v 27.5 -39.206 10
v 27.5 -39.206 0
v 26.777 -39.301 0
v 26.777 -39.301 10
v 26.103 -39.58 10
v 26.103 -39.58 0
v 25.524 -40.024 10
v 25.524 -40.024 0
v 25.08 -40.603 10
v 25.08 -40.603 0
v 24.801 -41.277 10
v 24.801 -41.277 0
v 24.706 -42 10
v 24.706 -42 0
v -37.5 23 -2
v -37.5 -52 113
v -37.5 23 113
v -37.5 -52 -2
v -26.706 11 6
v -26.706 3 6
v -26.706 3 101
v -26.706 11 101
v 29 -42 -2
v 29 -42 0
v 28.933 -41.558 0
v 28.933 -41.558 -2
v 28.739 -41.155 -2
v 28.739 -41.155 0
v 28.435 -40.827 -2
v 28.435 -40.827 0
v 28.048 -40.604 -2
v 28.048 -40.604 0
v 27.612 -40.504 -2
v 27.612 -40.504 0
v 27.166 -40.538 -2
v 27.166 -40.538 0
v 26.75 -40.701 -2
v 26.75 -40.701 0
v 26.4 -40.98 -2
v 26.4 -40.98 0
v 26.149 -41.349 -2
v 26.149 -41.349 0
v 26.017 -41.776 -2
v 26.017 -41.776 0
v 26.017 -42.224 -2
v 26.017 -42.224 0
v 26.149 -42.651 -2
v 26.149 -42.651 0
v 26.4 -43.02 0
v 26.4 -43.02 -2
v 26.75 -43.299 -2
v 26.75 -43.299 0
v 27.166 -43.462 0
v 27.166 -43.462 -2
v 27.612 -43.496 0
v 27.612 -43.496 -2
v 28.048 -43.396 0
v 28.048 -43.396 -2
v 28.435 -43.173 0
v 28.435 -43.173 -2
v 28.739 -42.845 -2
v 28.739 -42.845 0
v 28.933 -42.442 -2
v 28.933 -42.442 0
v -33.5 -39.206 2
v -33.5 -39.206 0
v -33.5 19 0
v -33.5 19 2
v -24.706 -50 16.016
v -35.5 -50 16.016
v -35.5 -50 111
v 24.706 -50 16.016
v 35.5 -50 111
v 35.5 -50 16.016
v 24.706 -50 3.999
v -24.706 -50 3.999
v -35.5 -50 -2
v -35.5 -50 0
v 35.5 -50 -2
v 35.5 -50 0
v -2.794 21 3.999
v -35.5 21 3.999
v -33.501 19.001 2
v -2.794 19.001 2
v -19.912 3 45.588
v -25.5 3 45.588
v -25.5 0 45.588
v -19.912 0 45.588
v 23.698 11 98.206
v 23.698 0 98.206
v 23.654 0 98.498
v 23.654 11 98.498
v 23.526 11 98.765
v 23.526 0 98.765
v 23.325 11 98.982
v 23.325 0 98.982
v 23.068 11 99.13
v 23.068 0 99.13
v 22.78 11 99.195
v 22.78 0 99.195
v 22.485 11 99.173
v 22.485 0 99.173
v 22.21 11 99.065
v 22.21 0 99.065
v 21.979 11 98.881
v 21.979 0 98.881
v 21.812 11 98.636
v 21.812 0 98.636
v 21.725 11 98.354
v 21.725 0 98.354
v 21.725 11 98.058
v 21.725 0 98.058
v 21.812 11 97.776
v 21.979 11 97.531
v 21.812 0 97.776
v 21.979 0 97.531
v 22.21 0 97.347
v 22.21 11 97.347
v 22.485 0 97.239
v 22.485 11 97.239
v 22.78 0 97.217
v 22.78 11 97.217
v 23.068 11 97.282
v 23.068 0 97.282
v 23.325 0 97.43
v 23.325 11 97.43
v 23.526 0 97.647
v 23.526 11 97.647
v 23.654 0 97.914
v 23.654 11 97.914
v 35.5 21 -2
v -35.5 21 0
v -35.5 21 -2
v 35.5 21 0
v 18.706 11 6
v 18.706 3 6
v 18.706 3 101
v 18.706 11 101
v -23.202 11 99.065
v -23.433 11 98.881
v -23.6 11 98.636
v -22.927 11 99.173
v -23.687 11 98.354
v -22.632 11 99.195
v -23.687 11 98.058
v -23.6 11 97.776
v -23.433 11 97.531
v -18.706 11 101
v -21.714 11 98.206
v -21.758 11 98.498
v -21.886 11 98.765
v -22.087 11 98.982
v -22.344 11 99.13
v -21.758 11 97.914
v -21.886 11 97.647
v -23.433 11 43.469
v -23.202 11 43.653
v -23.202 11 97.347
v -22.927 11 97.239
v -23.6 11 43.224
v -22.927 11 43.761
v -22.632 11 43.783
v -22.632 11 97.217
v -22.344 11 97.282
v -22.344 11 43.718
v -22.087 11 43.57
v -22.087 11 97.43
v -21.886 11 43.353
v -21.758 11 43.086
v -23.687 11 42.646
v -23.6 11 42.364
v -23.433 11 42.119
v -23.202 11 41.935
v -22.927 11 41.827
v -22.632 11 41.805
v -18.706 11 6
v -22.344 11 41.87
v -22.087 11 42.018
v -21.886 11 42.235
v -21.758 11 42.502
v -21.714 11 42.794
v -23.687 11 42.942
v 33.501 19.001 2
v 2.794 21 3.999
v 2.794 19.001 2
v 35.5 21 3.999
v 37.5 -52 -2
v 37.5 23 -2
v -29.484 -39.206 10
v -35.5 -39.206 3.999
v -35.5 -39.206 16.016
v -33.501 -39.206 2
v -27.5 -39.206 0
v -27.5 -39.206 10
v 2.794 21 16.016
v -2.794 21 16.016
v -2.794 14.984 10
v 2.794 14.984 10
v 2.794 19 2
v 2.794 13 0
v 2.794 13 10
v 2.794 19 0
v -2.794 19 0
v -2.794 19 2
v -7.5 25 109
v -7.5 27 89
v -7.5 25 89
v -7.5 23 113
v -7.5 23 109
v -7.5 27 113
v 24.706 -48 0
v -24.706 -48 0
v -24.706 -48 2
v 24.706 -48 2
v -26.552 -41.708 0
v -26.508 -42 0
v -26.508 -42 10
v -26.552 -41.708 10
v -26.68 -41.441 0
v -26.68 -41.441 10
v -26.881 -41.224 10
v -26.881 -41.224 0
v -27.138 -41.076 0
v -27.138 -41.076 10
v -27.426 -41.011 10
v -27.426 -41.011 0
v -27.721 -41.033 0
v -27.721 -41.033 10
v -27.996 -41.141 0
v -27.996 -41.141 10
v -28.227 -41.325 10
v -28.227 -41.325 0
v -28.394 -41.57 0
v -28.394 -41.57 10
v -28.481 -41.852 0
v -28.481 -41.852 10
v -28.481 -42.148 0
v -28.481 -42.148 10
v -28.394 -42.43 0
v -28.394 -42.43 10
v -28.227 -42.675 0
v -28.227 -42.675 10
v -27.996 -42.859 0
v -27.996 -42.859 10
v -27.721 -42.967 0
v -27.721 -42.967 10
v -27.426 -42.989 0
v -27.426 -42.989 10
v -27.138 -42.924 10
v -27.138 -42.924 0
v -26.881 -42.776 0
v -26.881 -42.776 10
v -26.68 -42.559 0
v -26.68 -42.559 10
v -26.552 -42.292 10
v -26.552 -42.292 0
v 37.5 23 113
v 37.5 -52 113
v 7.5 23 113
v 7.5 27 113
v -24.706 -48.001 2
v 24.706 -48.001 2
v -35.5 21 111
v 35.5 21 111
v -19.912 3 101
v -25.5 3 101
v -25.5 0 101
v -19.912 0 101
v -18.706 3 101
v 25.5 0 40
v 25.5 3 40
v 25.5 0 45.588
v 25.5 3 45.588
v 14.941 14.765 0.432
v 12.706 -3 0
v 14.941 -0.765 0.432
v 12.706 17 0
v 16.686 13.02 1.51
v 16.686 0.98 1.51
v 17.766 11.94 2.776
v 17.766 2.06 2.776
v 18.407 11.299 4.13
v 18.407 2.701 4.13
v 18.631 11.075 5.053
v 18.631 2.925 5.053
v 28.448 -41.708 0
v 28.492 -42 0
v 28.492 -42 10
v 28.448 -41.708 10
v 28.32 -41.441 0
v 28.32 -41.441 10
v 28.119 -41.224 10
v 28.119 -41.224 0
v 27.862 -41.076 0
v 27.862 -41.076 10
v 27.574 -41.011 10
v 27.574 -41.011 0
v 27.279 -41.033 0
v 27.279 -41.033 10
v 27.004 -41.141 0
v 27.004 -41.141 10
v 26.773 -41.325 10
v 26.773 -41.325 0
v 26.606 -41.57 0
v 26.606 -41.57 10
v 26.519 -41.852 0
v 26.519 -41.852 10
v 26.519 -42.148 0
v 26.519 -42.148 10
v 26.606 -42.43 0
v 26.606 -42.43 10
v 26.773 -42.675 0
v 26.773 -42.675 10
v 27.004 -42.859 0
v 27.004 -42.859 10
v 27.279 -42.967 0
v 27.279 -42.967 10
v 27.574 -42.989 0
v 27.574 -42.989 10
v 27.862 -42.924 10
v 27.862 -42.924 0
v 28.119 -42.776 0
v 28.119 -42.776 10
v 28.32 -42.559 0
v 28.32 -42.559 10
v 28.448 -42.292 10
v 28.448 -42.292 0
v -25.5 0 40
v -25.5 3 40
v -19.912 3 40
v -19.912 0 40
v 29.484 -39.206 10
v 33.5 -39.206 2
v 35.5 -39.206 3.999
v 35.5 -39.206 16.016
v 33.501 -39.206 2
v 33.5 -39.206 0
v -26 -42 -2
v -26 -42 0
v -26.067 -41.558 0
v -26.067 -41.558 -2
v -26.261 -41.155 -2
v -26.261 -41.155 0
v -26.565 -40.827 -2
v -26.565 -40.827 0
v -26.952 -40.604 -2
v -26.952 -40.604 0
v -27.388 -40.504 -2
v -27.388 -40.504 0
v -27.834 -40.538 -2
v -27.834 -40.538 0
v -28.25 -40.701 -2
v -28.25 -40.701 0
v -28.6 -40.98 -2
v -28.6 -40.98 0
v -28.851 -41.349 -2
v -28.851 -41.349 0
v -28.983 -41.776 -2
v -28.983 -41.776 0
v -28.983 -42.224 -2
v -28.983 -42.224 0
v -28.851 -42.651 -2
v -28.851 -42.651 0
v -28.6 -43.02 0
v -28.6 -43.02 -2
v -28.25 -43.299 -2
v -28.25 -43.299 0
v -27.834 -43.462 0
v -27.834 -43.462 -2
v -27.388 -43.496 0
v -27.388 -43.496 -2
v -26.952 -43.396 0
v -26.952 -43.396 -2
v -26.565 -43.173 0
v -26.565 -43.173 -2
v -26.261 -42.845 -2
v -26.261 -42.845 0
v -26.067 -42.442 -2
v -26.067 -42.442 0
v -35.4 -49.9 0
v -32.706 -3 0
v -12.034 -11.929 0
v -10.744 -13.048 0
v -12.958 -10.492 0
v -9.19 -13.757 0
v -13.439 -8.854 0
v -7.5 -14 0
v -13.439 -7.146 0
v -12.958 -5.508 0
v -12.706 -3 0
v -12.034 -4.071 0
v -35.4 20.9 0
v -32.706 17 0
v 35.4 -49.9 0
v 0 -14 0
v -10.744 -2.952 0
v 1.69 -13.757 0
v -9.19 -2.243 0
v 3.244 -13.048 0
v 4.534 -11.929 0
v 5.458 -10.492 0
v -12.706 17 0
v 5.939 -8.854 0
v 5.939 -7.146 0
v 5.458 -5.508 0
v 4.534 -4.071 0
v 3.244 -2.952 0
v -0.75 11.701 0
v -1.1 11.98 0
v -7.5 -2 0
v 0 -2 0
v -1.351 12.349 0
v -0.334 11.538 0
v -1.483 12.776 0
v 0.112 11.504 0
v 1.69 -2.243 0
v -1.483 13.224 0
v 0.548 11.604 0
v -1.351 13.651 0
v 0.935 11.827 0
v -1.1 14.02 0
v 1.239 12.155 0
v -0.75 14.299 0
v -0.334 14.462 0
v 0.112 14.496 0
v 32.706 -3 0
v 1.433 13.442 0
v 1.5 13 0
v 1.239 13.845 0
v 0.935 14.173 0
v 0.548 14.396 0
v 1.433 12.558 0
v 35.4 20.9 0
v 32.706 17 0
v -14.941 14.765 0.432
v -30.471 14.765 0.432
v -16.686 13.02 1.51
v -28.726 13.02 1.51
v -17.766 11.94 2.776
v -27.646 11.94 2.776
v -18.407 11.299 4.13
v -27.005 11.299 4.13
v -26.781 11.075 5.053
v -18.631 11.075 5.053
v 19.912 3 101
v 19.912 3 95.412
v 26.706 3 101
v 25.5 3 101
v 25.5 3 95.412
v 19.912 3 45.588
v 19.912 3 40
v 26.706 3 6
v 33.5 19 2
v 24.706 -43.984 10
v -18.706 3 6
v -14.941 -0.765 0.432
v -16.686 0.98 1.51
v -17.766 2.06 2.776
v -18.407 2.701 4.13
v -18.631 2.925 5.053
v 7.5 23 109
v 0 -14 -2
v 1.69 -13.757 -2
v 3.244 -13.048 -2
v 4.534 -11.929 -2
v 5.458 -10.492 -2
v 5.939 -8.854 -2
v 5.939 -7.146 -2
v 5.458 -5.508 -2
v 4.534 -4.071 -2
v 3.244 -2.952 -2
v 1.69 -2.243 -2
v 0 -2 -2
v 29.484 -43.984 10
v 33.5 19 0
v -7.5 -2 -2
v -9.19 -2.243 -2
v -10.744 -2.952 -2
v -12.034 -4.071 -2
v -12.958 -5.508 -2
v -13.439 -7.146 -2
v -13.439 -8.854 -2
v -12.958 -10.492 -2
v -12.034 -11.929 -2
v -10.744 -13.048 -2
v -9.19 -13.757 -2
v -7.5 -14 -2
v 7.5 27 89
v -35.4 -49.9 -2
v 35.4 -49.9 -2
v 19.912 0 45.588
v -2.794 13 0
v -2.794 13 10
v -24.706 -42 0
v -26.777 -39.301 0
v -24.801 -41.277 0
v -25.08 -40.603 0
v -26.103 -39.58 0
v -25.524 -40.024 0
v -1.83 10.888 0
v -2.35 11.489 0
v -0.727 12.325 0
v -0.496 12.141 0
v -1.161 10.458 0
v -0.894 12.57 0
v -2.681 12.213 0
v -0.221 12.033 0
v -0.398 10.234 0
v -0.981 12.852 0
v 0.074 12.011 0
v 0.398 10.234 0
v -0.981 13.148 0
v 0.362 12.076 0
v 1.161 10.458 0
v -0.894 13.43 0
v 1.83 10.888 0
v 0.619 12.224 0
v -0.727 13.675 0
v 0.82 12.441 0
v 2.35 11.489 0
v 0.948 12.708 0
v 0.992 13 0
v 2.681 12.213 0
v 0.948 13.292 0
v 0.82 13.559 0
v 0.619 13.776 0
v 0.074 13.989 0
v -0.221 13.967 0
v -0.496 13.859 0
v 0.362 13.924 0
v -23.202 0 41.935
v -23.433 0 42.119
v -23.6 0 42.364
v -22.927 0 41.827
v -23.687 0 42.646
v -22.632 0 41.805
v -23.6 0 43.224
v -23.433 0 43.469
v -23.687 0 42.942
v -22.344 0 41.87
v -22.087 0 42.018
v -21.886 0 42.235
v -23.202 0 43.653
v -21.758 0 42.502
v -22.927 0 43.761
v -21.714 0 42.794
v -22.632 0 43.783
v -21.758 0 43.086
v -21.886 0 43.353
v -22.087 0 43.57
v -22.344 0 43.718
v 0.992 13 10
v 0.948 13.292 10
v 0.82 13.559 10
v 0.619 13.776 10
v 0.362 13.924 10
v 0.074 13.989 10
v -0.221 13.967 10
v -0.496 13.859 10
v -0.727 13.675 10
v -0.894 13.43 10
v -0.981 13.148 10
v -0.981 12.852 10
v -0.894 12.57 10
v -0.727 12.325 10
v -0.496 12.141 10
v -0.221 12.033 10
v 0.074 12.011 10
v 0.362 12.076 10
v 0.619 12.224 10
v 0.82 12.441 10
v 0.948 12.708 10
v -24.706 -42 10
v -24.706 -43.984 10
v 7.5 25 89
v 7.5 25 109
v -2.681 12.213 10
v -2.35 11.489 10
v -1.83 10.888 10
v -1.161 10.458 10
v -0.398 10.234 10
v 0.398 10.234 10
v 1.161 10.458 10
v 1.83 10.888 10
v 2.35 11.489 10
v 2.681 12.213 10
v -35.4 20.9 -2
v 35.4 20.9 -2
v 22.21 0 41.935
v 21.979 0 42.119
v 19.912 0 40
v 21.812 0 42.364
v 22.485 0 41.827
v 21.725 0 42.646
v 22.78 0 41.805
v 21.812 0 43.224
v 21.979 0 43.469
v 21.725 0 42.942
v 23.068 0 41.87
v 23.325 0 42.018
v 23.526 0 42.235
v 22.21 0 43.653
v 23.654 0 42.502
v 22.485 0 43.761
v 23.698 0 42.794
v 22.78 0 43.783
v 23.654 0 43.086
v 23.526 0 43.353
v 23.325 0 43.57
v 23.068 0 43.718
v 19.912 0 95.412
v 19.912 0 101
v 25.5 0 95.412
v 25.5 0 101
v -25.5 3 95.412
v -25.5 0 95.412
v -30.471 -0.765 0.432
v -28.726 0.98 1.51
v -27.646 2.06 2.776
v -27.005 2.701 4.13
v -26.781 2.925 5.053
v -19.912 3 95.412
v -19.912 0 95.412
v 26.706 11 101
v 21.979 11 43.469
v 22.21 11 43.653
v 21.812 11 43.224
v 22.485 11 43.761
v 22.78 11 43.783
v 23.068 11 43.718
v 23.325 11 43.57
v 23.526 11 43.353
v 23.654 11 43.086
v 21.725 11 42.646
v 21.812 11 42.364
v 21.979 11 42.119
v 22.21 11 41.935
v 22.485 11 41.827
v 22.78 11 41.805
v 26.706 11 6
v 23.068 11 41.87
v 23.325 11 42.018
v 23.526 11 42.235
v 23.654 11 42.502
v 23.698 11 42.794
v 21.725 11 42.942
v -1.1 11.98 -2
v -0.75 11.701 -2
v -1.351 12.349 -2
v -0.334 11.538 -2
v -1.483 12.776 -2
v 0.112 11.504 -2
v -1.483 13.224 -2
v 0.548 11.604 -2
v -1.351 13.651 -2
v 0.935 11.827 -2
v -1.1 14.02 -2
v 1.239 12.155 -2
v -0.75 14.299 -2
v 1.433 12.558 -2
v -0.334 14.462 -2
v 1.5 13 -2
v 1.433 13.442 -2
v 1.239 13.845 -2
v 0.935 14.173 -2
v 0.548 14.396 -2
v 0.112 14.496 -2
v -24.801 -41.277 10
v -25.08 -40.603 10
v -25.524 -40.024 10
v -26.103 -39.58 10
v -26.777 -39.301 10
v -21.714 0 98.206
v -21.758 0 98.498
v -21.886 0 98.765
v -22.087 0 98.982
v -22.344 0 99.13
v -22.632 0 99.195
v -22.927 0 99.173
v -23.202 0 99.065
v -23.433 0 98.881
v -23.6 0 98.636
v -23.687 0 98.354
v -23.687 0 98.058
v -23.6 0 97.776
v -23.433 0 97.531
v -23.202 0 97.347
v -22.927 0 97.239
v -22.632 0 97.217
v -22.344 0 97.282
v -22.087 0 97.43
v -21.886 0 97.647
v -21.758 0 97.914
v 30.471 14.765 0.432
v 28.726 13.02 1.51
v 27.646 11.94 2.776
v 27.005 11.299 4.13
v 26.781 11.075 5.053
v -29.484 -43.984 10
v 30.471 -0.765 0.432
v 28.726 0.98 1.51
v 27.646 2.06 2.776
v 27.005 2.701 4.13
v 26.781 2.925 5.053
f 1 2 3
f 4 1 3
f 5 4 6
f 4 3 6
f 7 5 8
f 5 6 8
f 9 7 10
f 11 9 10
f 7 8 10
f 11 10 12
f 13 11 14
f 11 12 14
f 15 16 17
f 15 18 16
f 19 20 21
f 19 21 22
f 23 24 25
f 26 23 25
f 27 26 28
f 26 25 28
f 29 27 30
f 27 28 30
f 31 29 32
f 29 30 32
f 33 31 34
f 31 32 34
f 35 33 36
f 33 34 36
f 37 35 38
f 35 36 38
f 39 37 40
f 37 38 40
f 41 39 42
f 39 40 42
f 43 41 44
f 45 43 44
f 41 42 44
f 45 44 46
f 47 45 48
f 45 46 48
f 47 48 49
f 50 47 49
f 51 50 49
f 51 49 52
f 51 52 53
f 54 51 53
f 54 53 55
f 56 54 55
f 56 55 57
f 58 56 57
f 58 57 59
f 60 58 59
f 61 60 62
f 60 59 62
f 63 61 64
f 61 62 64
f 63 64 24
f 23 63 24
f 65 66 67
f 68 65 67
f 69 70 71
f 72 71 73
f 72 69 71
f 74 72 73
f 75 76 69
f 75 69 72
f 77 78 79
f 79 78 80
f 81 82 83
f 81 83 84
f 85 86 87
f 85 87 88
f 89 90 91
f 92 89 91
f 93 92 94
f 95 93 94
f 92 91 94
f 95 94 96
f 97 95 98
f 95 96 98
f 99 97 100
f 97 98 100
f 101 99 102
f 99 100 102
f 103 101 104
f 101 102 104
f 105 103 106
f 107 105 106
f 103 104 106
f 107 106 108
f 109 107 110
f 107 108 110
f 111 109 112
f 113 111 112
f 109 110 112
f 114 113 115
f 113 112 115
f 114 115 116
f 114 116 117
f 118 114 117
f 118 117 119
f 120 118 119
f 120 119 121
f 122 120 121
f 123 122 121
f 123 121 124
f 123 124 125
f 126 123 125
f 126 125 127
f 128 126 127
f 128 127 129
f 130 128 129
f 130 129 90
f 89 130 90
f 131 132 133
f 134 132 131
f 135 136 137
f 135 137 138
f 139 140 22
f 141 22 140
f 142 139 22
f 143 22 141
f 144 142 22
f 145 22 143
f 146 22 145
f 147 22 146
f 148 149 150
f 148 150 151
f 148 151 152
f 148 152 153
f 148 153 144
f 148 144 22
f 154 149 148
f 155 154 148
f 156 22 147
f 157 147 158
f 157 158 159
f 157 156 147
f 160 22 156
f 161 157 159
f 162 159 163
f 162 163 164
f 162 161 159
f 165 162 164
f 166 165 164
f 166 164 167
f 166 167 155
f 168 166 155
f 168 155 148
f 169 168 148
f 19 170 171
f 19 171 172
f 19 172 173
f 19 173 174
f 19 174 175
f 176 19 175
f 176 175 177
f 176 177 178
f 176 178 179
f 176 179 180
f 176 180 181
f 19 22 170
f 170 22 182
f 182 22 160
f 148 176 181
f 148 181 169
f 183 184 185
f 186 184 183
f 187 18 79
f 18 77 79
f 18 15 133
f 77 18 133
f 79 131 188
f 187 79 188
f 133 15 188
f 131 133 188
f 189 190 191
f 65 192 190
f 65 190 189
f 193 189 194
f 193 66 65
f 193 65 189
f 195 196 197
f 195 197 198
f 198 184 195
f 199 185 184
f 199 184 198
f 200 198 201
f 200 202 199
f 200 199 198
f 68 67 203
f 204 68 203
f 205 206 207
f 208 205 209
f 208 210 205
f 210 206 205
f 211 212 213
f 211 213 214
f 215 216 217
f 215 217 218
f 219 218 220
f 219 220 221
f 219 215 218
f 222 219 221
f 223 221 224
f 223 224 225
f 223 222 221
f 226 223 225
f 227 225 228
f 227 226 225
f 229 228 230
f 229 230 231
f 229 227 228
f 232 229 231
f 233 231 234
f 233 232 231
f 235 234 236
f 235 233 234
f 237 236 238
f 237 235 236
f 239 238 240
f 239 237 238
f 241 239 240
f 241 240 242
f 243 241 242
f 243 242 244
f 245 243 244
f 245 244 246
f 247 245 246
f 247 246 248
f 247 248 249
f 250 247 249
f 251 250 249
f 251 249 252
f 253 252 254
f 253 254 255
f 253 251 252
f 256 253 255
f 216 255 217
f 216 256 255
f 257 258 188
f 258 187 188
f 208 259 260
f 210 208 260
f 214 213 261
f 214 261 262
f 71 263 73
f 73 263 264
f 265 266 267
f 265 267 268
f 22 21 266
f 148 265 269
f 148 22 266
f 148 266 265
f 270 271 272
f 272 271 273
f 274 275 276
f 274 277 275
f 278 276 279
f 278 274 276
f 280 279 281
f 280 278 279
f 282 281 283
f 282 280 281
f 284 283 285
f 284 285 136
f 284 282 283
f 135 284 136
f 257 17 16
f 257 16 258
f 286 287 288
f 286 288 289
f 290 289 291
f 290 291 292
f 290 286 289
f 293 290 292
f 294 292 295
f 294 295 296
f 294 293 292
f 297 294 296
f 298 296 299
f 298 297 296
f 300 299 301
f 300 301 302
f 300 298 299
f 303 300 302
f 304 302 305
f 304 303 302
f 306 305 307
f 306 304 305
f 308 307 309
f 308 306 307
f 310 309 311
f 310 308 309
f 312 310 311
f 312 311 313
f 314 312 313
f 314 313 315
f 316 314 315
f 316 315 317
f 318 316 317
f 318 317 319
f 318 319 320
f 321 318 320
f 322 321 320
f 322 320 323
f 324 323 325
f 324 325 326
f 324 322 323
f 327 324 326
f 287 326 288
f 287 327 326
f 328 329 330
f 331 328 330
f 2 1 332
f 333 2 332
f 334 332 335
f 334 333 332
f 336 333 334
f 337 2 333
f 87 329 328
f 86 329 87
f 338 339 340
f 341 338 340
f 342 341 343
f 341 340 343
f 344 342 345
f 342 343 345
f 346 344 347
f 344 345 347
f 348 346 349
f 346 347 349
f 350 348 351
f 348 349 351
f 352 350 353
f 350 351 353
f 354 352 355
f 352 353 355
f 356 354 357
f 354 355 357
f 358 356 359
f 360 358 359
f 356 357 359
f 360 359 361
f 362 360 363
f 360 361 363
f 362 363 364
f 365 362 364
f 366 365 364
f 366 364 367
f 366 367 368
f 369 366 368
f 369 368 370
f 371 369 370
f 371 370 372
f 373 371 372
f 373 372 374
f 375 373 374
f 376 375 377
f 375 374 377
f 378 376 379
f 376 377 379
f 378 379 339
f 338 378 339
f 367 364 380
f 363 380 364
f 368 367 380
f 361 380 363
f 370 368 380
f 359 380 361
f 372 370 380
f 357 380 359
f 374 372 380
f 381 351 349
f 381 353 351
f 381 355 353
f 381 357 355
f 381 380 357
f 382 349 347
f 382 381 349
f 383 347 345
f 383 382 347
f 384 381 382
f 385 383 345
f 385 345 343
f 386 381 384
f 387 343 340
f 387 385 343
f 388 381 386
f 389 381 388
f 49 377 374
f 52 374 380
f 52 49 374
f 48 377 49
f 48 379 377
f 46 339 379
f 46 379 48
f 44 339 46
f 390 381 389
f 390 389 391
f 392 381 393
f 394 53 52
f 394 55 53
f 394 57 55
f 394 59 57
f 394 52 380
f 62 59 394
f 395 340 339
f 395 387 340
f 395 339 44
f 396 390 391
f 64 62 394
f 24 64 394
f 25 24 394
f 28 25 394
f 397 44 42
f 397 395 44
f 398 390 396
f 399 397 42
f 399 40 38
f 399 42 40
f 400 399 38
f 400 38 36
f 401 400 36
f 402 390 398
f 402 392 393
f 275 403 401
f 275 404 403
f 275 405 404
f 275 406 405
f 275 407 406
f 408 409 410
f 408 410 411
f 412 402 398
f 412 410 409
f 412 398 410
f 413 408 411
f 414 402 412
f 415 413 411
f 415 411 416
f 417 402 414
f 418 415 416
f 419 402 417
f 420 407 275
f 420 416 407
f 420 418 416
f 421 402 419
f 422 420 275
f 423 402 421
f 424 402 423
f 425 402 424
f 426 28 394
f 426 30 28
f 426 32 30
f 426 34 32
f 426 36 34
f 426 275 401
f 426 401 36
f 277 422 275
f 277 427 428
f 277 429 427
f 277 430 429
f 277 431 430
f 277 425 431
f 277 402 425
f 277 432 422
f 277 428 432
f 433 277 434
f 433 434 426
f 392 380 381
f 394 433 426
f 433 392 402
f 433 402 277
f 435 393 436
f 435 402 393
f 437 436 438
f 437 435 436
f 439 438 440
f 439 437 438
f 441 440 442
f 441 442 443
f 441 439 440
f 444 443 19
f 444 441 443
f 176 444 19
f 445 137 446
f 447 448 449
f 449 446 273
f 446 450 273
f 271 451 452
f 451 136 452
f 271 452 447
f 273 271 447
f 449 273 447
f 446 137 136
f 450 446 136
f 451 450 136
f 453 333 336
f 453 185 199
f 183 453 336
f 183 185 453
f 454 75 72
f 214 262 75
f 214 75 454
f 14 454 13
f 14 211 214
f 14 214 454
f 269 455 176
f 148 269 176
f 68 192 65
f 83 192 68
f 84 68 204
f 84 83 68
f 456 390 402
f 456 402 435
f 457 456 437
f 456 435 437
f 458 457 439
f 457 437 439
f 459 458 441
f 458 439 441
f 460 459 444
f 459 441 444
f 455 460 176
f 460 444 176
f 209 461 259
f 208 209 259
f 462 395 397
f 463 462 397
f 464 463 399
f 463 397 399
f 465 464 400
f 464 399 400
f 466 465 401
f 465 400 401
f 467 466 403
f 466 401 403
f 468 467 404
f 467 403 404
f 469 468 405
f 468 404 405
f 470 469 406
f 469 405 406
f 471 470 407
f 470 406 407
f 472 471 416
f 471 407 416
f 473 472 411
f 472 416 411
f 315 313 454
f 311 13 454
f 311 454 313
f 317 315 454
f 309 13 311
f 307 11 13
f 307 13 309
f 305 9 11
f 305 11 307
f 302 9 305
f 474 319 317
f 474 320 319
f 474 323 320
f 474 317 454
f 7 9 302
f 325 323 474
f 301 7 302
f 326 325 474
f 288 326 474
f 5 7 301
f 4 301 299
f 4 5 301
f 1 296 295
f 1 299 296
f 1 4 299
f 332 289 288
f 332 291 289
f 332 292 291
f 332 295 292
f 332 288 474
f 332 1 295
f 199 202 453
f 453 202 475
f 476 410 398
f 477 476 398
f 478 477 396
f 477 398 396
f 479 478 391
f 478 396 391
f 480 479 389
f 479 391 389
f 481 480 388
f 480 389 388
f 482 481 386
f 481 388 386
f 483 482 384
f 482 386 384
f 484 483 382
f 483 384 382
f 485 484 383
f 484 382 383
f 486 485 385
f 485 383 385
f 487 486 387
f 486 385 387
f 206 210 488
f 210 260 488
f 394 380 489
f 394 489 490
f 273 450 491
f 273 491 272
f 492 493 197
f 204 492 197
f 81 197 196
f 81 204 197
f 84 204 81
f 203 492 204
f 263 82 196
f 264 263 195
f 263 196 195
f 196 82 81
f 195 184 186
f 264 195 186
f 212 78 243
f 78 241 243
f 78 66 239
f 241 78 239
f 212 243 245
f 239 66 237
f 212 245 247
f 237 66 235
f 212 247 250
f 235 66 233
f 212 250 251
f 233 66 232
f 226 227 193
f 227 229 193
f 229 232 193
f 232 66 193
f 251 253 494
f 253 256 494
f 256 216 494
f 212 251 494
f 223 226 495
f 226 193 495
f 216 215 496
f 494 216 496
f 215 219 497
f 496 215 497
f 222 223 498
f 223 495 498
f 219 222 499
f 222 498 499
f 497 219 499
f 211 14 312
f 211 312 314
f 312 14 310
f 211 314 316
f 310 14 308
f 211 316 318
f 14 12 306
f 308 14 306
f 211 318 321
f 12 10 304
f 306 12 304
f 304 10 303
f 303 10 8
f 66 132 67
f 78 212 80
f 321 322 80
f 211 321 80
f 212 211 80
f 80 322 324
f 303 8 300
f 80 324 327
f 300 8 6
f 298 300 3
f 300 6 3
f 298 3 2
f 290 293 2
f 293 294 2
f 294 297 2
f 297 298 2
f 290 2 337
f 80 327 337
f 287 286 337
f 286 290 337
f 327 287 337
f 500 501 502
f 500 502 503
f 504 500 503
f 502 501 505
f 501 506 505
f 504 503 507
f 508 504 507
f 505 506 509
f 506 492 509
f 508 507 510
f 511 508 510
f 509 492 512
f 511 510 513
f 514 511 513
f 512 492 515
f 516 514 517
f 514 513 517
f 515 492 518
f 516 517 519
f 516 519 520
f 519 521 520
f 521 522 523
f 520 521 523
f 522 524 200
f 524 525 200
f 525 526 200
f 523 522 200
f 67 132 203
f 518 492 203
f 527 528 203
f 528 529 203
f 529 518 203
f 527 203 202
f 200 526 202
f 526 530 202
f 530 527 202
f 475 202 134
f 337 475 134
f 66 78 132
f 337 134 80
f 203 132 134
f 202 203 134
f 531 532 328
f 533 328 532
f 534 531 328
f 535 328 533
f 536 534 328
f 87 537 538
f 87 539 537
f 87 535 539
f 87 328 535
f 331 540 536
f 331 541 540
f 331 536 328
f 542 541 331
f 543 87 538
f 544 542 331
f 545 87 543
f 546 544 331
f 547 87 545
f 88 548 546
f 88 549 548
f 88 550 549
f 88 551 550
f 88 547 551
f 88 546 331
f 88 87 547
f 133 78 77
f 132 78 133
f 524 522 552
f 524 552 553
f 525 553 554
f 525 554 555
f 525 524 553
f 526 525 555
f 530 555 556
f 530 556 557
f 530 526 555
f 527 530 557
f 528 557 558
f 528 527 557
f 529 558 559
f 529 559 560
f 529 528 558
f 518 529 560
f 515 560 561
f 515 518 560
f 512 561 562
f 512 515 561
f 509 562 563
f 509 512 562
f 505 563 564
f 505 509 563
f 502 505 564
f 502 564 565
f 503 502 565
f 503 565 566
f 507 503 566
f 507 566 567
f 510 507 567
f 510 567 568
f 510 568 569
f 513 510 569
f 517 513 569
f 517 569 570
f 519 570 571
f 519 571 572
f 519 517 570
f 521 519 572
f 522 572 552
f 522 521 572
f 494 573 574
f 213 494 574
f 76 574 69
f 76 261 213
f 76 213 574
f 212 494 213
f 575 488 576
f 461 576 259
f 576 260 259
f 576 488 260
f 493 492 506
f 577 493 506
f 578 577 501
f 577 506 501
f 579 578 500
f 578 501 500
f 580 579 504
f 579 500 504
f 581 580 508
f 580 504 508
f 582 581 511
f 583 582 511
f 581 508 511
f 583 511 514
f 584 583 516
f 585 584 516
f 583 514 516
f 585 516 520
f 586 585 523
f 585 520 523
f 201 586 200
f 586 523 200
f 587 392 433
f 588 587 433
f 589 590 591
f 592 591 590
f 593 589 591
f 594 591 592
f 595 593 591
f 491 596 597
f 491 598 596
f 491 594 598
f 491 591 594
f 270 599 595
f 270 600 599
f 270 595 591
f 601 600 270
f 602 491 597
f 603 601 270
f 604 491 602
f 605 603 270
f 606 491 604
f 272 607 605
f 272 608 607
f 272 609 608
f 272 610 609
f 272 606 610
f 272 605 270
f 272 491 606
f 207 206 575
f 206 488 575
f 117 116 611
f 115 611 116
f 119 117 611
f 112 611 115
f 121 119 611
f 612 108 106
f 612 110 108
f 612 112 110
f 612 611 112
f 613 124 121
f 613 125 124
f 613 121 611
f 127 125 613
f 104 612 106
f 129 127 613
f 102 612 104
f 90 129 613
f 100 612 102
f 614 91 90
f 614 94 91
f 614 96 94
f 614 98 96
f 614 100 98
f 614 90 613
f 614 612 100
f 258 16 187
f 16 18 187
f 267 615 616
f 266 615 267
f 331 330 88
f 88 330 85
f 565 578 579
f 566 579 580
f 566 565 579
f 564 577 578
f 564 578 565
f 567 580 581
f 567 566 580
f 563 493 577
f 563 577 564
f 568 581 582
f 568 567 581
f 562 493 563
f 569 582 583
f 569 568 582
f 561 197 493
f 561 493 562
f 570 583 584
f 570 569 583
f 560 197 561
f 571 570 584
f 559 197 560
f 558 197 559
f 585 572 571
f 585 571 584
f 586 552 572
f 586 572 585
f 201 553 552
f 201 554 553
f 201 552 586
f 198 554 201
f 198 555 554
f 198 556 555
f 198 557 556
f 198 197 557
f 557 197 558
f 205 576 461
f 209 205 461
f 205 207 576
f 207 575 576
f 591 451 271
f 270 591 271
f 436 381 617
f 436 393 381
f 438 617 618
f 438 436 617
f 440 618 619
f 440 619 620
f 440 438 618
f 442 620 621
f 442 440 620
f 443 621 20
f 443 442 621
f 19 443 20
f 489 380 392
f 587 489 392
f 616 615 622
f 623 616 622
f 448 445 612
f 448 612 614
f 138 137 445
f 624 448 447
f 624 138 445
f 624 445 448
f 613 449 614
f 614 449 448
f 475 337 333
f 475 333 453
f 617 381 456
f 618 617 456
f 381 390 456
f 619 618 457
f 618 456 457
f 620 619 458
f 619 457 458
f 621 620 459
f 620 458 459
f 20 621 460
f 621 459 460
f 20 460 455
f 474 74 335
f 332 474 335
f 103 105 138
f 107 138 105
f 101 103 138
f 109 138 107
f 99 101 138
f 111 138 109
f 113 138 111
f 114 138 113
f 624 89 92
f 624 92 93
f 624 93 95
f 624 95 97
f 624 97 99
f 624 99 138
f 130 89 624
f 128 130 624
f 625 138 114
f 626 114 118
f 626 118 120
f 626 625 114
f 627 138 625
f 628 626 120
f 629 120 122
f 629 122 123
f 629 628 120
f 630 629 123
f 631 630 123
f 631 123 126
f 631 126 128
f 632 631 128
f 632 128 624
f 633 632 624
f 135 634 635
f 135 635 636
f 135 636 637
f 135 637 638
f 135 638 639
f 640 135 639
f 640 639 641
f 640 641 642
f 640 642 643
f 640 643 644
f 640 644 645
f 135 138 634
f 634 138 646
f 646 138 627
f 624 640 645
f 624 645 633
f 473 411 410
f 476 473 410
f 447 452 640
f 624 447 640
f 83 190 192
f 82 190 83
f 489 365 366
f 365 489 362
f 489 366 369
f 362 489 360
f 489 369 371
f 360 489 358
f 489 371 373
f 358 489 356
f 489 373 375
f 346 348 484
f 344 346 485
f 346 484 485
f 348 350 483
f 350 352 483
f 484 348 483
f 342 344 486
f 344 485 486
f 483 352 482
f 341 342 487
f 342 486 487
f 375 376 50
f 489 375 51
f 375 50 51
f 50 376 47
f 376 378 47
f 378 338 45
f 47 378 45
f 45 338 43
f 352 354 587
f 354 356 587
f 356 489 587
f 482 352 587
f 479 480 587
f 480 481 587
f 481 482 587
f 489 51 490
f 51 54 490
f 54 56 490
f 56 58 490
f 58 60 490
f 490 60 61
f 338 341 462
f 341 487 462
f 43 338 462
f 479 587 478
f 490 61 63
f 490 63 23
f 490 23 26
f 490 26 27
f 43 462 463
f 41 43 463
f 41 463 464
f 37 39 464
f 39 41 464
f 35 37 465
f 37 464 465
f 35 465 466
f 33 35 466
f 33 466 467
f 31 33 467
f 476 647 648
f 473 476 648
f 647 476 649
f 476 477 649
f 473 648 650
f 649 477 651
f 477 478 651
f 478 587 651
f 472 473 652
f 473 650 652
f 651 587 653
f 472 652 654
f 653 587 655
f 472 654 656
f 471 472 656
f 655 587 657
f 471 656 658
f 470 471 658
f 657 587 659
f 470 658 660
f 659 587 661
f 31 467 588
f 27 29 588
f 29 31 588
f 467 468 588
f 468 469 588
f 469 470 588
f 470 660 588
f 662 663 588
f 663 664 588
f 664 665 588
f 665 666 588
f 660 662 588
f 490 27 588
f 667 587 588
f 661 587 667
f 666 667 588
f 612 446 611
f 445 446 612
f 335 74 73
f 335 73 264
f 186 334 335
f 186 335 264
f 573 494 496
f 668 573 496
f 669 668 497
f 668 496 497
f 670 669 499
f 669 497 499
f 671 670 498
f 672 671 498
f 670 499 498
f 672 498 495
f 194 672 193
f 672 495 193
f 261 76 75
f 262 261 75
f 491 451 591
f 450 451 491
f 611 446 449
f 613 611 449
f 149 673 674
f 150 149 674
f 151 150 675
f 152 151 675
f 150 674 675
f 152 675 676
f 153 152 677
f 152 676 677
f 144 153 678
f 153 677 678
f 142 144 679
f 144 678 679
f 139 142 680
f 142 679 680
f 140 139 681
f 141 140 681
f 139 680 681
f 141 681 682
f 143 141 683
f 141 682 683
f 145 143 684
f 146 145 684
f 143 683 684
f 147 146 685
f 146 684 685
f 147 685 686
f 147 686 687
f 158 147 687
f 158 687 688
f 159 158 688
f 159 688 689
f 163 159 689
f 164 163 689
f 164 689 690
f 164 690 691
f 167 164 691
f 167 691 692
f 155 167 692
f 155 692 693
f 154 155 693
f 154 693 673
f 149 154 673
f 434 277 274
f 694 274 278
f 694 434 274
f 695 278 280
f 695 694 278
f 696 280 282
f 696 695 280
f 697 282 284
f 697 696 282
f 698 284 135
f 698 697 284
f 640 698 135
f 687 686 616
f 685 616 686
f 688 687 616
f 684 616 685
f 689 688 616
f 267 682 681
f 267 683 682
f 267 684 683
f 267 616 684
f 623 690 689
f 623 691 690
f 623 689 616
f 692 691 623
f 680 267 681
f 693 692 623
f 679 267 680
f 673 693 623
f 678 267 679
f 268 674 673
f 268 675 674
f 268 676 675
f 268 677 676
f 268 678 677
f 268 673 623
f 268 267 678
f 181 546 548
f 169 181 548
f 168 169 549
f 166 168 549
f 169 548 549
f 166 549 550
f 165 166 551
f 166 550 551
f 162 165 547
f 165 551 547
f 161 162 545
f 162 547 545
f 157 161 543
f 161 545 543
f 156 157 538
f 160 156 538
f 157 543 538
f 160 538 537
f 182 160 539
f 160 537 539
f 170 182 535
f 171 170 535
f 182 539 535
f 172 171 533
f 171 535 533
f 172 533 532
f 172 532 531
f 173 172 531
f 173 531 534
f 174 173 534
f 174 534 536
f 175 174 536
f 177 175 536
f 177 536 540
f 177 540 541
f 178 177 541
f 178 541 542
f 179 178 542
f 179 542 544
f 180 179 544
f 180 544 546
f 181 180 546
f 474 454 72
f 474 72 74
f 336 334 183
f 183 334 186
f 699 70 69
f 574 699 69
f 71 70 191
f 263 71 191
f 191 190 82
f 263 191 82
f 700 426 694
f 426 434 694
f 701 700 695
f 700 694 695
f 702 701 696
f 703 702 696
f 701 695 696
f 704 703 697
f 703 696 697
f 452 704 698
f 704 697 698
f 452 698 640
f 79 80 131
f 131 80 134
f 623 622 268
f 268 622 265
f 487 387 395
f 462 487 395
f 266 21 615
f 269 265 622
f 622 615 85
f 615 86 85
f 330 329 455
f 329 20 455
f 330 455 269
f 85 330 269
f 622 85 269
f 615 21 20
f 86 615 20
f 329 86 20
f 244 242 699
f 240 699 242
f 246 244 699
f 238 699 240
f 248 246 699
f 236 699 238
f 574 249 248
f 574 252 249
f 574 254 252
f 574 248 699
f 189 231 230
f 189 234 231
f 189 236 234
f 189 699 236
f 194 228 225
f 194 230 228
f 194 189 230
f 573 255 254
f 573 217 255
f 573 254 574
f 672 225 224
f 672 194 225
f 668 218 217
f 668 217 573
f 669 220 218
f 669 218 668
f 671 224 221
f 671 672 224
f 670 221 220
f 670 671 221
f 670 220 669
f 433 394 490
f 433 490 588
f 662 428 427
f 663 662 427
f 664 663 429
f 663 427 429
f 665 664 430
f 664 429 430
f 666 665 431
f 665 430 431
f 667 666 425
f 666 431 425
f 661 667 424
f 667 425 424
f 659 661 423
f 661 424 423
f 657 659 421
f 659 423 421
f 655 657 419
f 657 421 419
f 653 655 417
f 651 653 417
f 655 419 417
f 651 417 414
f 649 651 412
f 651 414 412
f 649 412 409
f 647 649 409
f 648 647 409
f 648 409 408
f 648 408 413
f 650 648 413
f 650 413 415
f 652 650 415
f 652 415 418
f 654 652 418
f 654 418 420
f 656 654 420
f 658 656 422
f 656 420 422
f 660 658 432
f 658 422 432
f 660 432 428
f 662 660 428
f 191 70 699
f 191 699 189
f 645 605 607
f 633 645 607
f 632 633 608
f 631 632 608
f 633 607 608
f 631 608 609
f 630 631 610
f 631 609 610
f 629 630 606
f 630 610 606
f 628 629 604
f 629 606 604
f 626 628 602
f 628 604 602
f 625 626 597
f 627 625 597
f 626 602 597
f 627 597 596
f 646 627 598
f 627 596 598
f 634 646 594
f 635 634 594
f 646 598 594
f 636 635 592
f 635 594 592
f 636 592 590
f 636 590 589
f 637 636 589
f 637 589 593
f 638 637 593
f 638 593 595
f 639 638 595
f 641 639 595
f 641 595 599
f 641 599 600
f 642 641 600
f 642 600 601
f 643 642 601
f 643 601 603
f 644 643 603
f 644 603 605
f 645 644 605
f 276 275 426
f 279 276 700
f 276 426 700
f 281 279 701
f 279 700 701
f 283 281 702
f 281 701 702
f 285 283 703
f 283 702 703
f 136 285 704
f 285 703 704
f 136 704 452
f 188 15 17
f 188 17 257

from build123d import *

# Parameters (mm, degrees)
SKETCH_W        = 70.8
SKETCH_H        = 70.8
PAD_DEPTH       = 2
POCKET_DEPTH    = 2
SKETCH002_W     = 8
SKETCH002_H     = 8
PAD001_DEPTH    = 101
SKETCH003_W     = 5.588
SKETCH003_H     = 5.588
PAD002_DEPTH    = 3
SKETCH004_R     = 0.992188
POCKET001_DEPTH = 20.901
FILLET_R        = 6
SKETCH005_R     = 1.5
POCKET002_DEPTH = 2
SKETCH006_W     = 75
SKETCH006_H     = 75
SKETCH006_W_2   = 71
SKETCH006_H_2   = 71
PAD003_DEPTH    = 111
SKETCH008_W     = 71
SKETCH008_H     = 71
SKETCH008_W_2   = 67
SKETCH008_H_2   = 67
PAD005_DEPTH    = 2
CHAMFER_SIZE    = 1.999
SKETCH009_W     = 75
SKETCH009_H     = 75
SKETCH009_R     = 0.992188
PAD006_DEPTH    = 10
CHAMFER001_SIZE = 6.015625
SKETCH010_W     = 75
SKETCH010_H     = 75
SKETCH010_W_2   = 71
SKETCH010_H_2   = 71
PAD007_DEPTH    = 2
SKETCH007_W     = 75
SKETCH007_H     = 75
PAD004_DEPTH    = 2
PAD008_DEPTH    = 7.5


with BuildPart() as body:
    # Sketch → Pad (new body)
    with BuildSketch(Plane.XY):
        with Locations((0, -14.5)):
            Rectangle(SKETCH_W, SKETCH_H)
    extrude(amount=-PAD_DEPTH)

    # Sketch001 → Pocket (cut)
    with BuildSketch(Plane.XY):
        with BuildLine():
            ThreePointArc((0, -14), (6, -8), (0, -2))
            Line((0, -2), (-7.5, -2))
            ThreePointArc((-7.5, -2), (-13.5, -8), (-7.5, -14))
            Line((-7.5, -14), (0, -14))
        make_face()
    extrude(amount=-POCKET_DEPTH, mode=Mode.SUBTRACT)

    # Sketch002 → Pad001 (join)
    with BuildSketch(Plane.XY):
        with Locations((22.706, 7)):
            Rectangle(SKETCH002_W, SKETCH002_H)
        with Locations((-22.706, 7)):
            Rectangle(SKETCH002_W, SKETCH002_H)
    extrude(amount=PAD001_DEPTH)

    # Sketch003 (on Face15 of Pad001) → Pad002 (join)
    with BuildSketch(Plane.XZ.offset(-3)):
        with Locations((22.706, 98.206)):
            Rectangle(SKETCH003_W, SKETCH003_H)
        with Locations((-22.706, 98.206)):
            Rectangle(SKETCH003_W, SKETCH003_H)
        with Locations((-22.706, 42.794)):
            Rectangle(SKETCH003_W, SKETCH003_H)
        with Locations((22.706, 42.794)):
            Rectangle(SKETCH003_W, SKETCH003_H)
    extrude(amount=PAD002_DEPTH)

    # Sketch004 (on Face40 of Pad002) → Pocket001 (cut, through all)
    with BuildSketch(Plane.XZ):
        with Locations((22.706, 98.206)):
            Circle(SKETCH004_R)
        with Locations((-22.706, 98.206)):
            Circle(SKETCH004_R)
        with Locations((-22.706, 42.794)):
            Circle(SKETCH004_R)
        with Locations((22.706, 42.794)):
            Circle(SKETCH004_R)
    extrude(amount=-POCKET001_DEPTH, mode=Mode.SUBTRACT)

    # Fillet
    fillet_edges = [body.edges().sort_by_distance(p)[0] for p in [
        (22.706, 3, 0),
        (26.706, 7, 0),
        (22.706, 11, 0),
        (18.706, 7, 0),
        (-22.706, 11, 0),
        (-26.706, 7, 0),
        (-18.706, 7, 0),
        (-22.706, 3, 0),
    ]]
    fillet(fillet_edges, radius=FILLET_R)

    # Sketch005 → Pocket002 (cut)
    with BuildSketch(Plane.XY):
        with Locations((27.5, -42)):
            Circle(SKETCH005_R)
        with Locations((-27.5, -42)):
            Circle(SKETCH005_R)
        with Locations((0, 13)):
            Circle(SKETCH005_R)
    extrude(amount=-POCKET002_DEPTH, mode=Mode.SUBTRACT)


with BuildPart() as body001:
    # Sketch006 → Pad003 (new body)
    with BuildSketch(Plane.XY):
        with Locations((0, -14.5)):
            Rectangle(SKETCH006_W, SKETCH006_H)
        with Locations((0, -14.5)):
            Rectangle(SKETCH006_W_2, SKETCH006_H_2, mode=Mode.SUBTRACT)
    extrude(amount=PAD003_DEPTH)

    # Sketch008 → Pad005 (join)
    with BuildSketch(Plane.XY):
        with Locations((0, -14.5)):
            Rectangle(SKETCH008_W, SKETCH008_H)
        with Locations((0, -14.5)):
            Rectangle(SKETCH008_W_2, SKETCH008_H_2, mode=Mode.SUBTRACT)
    extrude(amount=PAD005_DEPTH)

    # Chamfer
    chamfer_edges = [body001.edges().sort_by_distance(p)[0] for p in [
        (0, -50, 2),
        (35.5, -14.5, 2),
        (-35.5, -14.5, 2),
        (0, 21, 2),
    ]]
    chamfer(chamfer_edges, length=CHAMFER_SIZE)

    # Sketch009 → Pad006 (join)
    with BuildSketch(Plane.XY):
        with Locations((0, -14.5)):
            Rectangle(SKETCH009_W, SKETCH009_H)
        with Locations((0, 13)):
            Circle(SKETCH009_R, mode=Mode.SUBTRACT)
        with Locations((27.5, -42)):
            Circle(SKETCH009_R, mode=Mode.SUBTRACT)
        with Locations((-27.5, -42)):
            Circle(SKETCH009_R, mode=Mode.SUBTRACT)
        with BuildLine():
            ThreePointArc((27.5, -39.206), (25.524344, -40.024344), (24.706, -42))
            Line((24.706, -50), (24.706, -42))
            Line((-24.706, -50), (24.706, -50))
            Line((-24.706, -42), (-24.706, -50))
            ThreePointArc((-24.706, -42), (-25.524344, -40.024344), (-27.5, -39.206))
            Line((-35.5, -39.206), (-27.5, -39.206))
            Line((-35.5, 21), (-35.5, -39.206))
            Line((-2.794, 21), (-35.5, 21))
            Line((-2.794, 13), (-2.794, 21))
            ThreePointArc((-2.794, 13), (0, 10.206), (2.794, 13))
            Line((2.794, 21), (2.794, 13))
            Line((35.5, 21), (2.794, 21))
            Line((35.5, -39.206), (35.5, 21))
            Line((27.5, -39.206), (35.5, -39.206))
        make_face(mode=Mode.SUBTRACT)
    extrude(amount=PAD006_DEPTH)

    # Chamfer001
    chamfer001_edges = [body001.edges().sort_by_distance(p)[0] for p in [
        (-35.5, -44.603, 10),
        (-30.103, -50, 10),
        (35.5, -44.603, 10),
        (30.103, -50, 10),
        (0, 21, 10),
    ]]
    chamfer(chamfer001_edges, length=CHAMFER001_SIZE)

    # Sketch010 → Pad007 (join)
    with BuildSketch(Plane.XY):
        with Locations((0, -14.5)):
            Rectangle(SKETCH010_W, SKETCH010_H)
        with Locations((0, -14.5)):
            Rectangle(SKETCH010_W_2, SKETCH010_H_2, mode=Mode.SUBTRACT)
    extrude(amount=-PAD007_DEPTH)

    # Sketch007 (on Face10 of Pad003) → Pad004 (join)
    with BuildSketch(Plane.XY.offset(111)):
        with Locations((0, -14.5)):
            Rectangle(SKETCH007_W, SKETCH007_H)
    extrude(amount=PAD004_DEPTH)


with BuildPart() as body002:
    # Sketch011 → Pad008 (new body, symmetric)
    with BuildSketch(Plane.YZ):
        Polygon((23, 113), (27, 113), (27, 89), (25, 89), (25, 109), (23, 109), align=None)
    extrude(amount=PAD008_DEPTH, both=True)


solid = Compound([body.part, body001.part, body002.part])
